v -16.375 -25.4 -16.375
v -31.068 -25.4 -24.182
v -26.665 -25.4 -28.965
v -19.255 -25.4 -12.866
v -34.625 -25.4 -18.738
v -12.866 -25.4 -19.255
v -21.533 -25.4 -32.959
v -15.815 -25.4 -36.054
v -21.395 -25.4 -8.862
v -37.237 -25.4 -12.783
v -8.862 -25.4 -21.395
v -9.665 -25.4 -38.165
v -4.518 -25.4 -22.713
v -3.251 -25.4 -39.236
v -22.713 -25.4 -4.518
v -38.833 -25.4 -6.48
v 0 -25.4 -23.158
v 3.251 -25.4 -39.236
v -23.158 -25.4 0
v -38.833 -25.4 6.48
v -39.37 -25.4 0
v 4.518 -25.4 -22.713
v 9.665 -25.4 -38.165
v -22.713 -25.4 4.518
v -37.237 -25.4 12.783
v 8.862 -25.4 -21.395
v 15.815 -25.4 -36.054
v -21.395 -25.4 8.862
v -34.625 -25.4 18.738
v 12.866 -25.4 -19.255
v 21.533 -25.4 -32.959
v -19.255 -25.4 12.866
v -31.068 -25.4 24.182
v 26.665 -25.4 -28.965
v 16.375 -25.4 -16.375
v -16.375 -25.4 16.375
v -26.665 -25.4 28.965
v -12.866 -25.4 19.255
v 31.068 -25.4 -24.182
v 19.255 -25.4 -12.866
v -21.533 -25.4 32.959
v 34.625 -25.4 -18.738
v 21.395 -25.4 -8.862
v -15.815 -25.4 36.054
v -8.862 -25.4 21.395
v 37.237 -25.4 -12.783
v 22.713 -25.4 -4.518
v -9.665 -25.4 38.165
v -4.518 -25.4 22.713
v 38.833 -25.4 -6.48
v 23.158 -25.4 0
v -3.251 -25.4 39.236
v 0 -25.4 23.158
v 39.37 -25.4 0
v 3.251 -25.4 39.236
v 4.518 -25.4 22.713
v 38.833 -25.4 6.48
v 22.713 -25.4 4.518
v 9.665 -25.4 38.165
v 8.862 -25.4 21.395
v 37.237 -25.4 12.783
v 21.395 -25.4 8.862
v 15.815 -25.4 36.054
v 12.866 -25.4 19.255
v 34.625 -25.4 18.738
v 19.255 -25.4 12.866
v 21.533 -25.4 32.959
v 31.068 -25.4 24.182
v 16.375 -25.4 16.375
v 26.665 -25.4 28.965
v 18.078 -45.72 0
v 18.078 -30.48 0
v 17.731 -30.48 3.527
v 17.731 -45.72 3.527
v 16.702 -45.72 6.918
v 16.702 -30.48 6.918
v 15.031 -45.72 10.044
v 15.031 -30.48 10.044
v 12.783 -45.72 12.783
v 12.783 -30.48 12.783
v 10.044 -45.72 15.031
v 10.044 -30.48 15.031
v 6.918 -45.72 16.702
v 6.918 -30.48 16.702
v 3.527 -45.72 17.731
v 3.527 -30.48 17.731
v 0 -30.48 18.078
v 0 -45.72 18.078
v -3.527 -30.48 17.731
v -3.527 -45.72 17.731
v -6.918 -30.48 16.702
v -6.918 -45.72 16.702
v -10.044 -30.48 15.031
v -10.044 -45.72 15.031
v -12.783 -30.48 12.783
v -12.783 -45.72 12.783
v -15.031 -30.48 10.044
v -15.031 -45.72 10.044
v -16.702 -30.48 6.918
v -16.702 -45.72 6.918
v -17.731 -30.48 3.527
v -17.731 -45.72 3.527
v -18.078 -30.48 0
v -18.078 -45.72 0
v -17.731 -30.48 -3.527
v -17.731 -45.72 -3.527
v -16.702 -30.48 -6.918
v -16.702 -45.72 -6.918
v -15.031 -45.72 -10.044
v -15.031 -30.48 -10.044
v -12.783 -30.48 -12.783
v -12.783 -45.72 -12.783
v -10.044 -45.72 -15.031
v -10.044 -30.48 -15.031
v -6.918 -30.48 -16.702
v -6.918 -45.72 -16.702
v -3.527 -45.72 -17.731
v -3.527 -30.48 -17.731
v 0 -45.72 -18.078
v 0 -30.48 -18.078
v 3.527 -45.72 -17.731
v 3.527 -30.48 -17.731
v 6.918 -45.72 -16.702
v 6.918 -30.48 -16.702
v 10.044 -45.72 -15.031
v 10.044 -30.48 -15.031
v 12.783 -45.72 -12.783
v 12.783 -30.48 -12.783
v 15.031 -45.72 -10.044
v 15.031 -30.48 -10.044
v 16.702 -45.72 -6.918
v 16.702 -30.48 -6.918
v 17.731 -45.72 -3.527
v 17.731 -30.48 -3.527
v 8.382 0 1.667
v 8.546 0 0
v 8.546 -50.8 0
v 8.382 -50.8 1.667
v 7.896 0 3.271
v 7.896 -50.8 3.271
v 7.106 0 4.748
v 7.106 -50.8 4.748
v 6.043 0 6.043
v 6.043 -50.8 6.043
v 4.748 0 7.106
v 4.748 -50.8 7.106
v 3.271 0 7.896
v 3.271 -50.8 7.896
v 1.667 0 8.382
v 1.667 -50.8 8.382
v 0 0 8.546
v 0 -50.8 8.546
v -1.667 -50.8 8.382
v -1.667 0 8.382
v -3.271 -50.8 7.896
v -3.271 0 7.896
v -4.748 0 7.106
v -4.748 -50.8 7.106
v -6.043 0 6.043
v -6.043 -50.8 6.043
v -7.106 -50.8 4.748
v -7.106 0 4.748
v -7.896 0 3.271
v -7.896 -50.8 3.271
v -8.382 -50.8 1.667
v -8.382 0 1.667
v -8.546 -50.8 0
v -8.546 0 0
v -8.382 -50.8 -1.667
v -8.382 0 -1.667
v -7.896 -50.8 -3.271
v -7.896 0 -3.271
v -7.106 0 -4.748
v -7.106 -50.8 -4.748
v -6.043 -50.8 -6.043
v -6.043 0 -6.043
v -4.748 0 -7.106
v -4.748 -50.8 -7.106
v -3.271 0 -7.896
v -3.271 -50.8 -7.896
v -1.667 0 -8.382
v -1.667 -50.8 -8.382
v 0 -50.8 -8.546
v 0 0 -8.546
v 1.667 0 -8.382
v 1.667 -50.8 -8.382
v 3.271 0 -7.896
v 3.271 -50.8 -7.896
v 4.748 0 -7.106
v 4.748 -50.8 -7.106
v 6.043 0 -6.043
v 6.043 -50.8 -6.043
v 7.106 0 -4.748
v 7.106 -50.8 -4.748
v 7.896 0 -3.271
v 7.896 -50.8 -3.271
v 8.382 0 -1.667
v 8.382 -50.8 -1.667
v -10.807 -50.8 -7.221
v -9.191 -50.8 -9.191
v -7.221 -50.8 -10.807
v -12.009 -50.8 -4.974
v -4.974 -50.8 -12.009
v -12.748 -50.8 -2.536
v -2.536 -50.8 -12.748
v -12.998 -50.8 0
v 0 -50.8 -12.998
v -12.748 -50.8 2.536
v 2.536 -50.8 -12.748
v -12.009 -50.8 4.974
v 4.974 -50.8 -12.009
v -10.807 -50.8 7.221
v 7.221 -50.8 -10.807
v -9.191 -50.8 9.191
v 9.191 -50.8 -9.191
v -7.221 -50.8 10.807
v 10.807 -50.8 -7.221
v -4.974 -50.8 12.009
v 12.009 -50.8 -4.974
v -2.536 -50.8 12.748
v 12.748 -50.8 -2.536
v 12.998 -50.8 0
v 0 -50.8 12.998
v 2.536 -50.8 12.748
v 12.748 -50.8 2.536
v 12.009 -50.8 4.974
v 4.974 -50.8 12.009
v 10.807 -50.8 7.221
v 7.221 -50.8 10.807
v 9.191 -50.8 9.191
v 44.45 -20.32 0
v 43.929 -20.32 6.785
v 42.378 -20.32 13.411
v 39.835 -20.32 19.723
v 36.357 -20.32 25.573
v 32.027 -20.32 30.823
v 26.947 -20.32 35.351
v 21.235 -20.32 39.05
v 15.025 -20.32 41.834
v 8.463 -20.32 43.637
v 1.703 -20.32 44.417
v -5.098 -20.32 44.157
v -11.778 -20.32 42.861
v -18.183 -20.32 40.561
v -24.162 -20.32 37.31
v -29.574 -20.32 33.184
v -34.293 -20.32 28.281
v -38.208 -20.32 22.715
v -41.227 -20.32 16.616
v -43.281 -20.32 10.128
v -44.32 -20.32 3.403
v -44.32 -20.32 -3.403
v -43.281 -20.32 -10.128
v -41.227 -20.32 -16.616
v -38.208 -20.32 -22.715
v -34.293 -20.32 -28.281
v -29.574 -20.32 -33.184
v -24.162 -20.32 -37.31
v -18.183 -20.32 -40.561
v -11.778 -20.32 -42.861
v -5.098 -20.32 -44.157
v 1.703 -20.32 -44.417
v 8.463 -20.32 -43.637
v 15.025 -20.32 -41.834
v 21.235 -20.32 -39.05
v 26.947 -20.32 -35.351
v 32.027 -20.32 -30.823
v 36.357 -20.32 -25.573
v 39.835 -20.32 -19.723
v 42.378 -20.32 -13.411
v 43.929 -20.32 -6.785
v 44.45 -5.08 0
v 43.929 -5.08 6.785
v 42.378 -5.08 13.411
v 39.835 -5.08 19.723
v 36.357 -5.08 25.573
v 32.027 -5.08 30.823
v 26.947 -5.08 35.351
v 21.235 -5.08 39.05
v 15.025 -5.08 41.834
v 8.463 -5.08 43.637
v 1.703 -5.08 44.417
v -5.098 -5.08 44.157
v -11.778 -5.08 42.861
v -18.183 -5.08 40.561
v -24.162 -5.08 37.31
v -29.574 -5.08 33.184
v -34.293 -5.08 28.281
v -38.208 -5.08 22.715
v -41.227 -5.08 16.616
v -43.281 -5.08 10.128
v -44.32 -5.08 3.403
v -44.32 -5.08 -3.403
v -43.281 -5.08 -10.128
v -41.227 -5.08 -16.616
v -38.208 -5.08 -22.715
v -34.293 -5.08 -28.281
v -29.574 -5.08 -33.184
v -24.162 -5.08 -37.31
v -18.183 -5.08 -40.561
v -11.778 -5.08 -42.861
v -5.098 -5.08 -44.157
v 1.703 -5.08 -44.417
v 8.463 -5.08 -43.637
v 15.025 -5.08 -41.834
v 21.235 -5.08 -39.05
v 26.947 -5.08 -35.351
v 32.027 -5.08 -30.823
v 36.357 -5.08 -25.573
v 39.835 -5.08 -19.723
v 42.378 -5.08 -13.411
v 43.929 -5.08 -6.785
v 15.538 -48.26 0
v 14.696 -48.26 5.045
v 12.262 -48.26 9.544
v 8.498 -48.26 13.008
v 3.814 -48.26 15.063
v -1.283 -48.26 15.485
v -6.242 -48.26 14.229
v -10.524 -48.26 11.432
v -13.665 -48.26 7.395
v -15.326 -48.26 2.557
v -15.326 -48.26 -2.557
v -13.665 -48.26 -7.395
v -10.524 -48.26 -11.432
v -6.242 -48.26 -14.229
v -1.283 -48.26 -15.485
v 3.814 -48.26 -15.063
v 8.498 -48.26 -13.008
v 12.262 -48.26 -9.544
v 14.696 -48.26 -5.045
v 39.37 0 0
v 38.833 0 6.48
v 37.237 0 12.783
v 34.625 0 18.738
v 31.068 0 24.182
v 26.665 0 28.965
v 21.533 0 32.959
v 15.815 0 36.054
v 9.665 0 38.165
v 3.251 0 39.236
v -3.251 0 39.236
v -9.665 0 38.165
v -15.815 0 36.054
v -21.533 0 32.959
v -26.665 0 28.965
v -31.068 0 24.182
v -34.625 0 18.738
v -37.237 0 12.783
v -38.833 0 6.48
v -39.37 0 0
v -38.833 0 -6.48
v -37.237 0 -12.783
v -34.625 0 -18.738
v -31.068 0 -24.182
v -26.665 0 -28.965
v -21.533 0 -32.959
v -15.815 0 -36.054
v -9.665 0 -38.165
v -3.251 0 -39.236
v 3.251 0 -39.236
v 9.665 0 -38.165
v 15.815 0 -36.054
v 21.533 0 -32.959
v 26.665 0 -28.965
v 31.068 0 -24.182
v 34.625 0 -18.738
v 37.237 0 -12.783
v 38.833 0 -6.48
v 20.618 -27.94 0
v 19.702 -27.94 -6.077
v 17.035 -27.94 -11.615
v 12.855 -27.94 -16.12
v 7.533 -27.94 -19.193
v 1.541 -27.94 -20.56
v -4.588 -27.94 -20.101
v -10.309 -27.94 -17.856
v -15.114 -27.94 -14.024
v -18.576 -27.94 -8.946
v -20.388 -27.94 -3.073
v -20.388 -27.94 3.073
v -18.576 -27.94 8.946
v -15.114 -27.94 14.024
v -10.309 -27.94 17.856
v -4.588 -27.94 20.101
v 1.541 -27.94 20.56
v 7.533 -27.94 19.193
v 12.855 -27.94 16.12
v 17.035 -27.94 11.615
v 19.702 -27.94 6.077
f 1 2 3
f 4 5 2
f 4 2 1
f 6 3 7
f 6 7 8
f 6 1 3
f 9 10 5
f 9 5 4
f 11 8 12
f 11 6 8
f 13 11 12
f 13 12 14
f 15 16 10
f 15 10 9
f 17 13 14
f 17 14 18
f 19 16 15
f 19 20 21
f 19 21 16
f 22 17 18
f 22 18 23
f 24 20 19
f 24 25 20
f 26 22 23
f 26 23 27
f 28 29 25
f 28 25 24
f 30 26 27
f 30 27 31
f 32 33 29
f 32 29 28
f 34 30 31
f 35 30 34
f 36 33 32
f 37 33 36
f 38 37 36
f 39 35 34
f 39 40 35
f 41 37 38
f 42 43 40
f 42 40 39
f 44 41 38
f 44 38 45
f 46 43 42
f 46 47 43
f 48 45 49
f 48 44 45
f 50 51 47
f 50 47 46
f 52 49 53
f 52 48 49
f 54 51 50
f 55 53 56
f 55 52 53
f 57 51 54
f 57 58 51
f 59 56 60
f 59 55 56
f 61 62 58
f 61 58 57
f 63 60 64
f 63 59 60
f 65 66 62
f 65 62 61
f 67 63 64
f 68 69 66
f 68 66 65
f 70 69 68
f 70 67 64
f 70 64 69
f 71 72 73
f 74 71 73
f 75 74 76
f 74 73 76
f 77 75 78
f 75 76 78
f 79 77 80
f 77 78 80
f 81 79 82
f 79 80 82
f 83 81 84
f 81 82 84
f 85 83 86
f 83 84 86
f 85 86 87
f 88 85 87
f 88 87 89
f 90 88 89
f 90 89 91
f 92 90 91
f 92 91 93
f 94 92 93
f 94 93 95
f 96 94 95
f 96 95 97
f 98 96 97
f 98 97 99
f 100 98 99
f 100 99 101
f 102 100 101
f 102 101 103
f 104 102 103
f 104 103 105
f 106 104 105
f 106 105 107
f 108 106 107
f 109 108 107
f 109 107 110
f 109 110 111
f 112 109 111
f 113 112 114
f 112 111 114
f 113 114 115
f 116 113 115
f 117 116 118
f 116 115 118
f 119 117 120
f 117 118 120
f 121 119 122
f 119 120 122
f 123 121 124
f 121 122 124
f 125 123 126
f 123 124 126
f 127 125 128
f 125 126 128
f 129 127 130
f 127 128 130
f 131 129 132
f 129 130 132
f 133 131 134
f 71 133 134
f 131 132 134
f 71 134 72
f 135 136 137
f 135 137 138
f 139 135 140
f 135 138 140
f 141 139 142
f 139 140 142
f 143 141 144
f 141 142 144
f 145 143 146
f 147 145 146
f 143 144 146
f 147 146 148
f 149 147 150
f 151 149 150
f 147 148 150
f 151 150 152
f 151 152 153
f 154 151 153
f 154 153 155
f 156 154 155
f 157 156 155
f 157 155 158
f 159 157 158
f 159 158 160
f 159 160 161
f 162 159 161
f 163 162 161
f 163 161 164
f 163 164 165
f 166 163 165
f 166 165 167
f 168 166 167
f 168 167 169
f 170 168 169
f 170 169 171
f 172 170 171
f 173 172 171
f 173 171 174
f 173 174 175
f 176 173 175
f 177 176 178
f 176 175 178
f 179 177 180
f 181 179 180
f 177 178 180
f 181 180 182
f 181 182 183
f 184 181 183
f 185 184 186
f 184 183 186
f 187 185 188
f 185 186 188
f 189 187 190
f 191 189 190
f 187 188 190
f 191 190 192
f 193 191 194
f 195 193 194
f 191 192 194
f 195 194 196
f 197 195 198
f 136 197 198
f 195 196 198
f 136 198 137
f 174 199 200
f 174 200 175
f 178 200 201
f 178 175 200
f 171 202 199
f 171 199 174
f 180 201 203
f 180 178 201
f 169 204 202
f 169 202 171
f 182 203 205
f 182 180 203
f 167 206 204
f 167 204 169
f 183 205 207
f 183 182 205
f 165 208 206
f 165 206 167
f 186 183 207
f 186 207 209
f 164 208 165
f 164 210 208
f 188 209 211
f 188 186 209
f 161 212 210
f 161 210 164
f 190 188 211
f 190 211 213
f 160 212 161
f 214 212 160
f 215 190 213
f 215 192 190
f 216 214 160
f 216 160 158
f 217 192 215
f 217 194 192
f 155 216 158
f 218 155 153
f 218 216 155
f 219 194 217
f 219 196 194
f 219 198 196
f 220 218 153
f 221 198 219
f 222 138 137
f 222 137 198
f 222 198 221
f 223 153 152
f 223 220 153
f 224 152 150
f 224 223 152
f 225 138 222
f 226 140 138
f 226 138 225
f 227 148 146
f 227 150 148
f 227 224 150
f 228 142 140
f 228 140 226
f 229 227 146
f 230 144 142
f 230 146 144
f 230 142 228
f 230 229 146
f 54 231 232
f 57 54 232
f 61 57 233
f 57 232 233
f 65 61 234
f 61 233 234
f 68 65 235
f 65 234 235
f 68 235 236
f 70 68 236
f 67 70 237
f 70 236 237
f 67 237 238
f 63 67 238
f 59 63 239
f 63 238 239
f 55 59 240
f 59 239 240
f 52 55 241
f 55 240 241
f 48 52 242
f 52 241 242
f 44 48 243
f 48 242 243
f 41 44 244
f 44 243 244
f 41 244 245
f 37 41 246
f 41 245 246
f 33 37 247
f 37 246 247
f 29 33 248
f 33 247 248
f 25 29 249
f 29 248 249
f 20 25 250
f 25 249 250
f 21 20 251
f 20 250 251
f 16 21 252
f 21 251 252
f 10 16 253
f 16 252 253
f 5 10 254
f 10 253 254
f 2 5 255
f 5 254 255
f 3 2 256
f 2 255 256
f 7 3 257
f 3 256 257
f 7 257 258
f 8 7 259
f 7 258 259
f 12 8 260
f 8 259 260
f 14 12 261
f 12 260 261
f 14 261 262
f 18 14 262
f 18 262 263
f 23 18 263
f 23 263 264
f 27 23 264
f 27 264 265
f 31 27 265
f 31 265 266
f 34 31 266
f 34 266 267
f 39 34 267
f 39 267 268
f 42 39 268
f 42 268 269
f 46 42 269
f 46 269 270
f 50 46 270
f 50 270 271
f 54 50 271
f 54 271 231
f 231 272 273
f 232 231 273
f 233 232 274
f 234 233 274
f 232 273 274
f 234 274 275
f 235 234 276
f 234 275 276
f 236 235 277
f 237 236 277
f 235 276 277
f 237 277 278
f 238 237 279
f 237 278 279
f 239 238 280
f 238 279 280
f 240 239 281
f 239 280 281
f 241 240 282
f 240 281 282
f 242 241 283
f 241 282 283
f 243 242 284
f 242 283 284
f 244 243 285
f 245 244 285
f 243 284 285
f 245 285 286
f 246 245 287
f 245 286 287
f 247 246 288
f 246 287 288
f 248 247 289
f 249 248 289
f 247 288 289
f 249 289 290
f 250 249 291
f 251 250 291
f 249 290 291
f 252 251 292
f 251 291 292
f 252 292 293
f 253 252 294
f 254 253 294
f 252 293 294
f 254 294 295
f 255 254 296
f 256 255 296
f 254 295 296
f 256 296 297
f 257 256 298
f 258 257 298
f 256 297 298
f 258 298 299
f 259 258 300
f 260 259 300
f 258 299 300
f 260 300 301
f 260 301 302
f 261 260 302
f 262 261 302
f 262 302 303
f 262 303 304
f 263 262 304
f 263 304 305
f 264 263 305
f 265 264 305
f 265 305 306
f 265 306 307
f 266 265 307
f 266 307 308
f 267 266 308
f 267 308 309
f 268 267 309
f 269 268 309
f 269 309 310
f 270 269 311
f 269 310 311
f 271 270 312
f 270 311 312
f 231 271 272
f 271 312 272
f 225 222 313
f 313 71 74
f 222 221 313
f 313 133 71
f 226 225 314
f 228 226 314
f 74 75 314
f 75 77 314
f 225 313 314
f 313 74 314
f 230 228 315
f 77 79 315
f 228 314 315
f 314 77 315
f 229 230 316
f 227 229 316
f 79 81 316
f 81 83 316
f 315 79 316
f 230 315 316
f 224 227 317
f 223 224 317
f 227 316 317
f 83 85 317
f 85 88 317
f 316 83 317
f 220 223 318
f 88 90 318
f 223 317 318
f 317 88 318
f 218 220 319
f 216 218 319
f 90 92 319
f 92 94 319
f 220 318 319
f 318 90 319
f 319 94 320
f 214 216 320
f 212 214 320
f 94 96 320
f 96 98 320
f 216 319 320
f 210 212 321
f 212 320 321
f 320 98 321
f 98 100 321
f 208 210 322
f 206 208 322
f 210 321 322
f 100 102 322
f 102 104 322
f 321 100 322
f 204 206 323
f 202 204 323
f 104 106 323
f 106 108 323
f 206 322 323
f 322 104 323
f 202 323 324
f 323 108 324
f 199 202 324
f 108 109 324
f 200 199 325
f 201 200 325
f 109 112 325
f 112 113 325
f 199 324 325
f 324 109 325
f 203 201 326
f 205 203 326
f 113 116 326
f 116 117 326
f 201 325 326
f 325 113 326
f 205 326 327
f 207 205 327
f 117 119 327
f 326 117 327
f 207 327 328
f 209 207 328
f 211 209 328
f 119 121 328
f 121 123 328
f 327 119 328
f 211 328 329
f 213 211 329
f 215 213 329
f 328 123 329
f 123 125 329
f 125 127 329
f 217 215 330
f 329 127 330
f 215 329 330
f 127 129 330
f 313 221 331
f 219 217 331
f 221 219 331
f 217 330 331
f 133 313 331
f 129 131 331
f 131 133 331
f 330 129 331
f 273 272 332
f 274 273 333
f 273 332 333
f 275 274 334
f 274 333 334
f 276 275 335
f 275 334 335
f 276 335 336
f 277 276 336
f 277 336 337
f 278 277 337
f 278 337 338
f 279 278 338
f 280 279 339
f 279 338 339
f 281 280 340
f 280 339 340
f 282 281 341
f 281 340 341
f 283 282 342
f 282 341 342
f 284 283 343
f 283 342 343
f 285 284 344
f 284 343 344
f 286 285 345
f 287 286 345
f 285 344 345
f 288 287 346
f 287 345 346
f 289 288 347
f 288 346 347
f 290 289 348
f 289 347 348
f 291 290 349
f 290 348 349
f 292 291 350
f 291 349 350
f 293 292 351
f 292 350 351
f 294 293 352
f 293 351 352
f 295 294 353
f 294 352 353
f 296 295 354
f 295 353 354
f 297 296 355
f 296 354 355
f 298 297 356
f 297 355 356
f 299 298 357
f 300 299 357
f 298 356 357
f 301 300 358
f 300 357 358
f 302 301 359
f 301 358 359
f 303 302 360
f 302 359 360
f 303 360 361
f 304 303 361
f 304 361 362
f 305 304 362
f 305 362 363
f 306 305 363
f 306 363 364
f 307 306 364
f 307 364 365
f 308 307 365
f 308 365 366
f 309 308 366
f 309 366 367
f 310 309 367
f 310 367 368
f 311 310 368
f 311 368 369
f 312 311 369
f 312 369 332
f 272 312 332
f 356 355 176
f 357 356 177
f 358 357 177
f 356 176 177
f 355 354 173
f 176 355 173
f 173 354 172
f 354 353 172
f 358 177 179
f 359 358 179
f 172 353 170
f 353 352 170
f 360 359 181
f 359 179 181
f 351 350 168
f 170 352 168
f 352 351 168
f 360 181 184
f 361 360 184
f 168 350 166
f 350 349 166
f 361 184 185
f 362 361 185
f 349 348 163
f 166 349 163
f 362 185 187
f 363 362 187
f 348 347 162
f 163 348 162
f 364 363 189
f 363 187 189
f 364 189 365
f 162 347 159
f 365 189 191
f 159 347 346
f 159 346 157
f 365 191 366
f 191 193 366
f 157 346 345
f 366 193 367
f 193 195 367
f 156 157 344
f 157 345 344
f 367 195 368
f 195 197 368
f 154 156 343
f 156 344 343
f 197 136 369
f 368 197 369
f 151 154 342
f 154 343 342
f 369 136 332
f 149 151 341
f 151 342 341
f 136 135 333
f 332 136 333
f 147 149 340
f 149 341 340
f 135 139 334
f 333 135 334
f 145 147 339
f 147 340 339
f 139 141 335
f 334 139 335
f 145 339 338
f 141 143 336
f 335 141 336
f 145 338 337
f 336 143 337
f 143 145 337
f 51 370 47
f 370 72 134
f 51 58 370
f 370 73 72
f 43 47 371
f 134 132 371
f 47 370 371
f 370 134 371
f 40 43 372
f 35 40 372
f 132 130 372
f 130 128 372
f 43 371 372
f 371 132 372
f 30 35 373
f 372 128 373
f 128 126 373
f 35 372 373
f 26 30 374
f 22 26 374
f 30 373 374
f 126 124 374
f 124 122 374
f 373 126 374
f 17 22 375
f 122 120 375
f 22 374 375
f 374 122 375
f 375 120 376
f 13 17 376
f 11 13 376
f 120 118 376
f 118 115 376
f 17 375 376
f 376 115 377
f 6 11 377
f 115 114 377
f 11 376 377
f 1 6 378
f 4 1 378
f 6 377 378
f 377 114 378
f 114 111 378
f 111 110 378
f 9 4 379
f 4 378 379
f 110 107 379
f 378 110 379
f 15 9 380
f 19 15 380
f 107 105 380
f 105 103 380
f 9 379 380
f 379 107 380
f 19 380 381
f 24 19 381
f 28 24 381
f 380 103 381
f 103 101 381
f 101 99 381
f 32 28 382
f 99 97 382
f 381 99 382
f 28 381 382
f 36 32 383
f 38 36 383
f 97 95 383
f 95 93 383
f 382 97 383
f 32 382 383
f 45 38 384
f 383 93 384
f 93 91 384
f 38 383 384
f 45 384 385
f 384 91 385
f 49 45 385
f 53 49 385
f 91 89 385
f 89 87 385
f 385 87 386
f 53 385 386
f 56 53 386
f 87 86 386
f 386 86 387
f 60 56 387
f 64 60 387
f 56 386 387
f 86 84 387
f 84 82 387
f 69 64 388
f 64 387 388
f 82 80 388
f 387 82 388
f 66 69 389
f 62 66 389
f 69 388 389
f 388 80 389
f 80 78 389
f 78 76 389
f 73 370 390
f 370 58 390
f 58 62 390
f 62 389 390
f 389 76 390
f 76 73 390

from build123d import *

# Parameters (mm, degrees)
F0_R     = 44.45
F1_DEPTH = 25.4
F2_R     = 18.07801
F3_DEPTH = 50.8
F4_R     = 8.546468
F5_DEPTH = 127
F6_SIZE  = 5.08
F7_SIZE  = 5.08


with BuildPart() as f1:
    # F0 (on Front) → F1 (new body)
    with BuildSketch(Plane.XZ):
        Circle(F0_R)
    extrude(amount=F1_DEPTH)

    # F2 (on Front) → F3 (join)
    with BuildSketch(Plane.XZ):
        Circle(F2_R)
    extrude(amount=F3_DEPTH)

    # F4 (on face) → F5 (cut)
    with BuildSketch(Plane.XZ.offset(50.8)):
        Circle(F4_R)
    extrude(amount=-F5_DEPTH, mode=Mode.SUBTRACT)

    # F6
    f6_edges = [f1.edges().sort_by_distance(p)[0] for p in [
        (-18.07801, -25.4, 0),
        (18.07801, -38.1, 0),
        (-18.07801, -50.8, 0),
    ]]
    chamfer(f6_edges, length=F6_SIZE)

    # F7
    f7_edges = [f1.edges().sort_by_distance(p)[0] for p in [
        (44.45, -12.7, 0),
        (-44.45, 0, 0),
        (-44.45, -25.4, 0),
    ]]
    chamfer(f7_edges, length=F7_SIZE)


solid = f1.part
